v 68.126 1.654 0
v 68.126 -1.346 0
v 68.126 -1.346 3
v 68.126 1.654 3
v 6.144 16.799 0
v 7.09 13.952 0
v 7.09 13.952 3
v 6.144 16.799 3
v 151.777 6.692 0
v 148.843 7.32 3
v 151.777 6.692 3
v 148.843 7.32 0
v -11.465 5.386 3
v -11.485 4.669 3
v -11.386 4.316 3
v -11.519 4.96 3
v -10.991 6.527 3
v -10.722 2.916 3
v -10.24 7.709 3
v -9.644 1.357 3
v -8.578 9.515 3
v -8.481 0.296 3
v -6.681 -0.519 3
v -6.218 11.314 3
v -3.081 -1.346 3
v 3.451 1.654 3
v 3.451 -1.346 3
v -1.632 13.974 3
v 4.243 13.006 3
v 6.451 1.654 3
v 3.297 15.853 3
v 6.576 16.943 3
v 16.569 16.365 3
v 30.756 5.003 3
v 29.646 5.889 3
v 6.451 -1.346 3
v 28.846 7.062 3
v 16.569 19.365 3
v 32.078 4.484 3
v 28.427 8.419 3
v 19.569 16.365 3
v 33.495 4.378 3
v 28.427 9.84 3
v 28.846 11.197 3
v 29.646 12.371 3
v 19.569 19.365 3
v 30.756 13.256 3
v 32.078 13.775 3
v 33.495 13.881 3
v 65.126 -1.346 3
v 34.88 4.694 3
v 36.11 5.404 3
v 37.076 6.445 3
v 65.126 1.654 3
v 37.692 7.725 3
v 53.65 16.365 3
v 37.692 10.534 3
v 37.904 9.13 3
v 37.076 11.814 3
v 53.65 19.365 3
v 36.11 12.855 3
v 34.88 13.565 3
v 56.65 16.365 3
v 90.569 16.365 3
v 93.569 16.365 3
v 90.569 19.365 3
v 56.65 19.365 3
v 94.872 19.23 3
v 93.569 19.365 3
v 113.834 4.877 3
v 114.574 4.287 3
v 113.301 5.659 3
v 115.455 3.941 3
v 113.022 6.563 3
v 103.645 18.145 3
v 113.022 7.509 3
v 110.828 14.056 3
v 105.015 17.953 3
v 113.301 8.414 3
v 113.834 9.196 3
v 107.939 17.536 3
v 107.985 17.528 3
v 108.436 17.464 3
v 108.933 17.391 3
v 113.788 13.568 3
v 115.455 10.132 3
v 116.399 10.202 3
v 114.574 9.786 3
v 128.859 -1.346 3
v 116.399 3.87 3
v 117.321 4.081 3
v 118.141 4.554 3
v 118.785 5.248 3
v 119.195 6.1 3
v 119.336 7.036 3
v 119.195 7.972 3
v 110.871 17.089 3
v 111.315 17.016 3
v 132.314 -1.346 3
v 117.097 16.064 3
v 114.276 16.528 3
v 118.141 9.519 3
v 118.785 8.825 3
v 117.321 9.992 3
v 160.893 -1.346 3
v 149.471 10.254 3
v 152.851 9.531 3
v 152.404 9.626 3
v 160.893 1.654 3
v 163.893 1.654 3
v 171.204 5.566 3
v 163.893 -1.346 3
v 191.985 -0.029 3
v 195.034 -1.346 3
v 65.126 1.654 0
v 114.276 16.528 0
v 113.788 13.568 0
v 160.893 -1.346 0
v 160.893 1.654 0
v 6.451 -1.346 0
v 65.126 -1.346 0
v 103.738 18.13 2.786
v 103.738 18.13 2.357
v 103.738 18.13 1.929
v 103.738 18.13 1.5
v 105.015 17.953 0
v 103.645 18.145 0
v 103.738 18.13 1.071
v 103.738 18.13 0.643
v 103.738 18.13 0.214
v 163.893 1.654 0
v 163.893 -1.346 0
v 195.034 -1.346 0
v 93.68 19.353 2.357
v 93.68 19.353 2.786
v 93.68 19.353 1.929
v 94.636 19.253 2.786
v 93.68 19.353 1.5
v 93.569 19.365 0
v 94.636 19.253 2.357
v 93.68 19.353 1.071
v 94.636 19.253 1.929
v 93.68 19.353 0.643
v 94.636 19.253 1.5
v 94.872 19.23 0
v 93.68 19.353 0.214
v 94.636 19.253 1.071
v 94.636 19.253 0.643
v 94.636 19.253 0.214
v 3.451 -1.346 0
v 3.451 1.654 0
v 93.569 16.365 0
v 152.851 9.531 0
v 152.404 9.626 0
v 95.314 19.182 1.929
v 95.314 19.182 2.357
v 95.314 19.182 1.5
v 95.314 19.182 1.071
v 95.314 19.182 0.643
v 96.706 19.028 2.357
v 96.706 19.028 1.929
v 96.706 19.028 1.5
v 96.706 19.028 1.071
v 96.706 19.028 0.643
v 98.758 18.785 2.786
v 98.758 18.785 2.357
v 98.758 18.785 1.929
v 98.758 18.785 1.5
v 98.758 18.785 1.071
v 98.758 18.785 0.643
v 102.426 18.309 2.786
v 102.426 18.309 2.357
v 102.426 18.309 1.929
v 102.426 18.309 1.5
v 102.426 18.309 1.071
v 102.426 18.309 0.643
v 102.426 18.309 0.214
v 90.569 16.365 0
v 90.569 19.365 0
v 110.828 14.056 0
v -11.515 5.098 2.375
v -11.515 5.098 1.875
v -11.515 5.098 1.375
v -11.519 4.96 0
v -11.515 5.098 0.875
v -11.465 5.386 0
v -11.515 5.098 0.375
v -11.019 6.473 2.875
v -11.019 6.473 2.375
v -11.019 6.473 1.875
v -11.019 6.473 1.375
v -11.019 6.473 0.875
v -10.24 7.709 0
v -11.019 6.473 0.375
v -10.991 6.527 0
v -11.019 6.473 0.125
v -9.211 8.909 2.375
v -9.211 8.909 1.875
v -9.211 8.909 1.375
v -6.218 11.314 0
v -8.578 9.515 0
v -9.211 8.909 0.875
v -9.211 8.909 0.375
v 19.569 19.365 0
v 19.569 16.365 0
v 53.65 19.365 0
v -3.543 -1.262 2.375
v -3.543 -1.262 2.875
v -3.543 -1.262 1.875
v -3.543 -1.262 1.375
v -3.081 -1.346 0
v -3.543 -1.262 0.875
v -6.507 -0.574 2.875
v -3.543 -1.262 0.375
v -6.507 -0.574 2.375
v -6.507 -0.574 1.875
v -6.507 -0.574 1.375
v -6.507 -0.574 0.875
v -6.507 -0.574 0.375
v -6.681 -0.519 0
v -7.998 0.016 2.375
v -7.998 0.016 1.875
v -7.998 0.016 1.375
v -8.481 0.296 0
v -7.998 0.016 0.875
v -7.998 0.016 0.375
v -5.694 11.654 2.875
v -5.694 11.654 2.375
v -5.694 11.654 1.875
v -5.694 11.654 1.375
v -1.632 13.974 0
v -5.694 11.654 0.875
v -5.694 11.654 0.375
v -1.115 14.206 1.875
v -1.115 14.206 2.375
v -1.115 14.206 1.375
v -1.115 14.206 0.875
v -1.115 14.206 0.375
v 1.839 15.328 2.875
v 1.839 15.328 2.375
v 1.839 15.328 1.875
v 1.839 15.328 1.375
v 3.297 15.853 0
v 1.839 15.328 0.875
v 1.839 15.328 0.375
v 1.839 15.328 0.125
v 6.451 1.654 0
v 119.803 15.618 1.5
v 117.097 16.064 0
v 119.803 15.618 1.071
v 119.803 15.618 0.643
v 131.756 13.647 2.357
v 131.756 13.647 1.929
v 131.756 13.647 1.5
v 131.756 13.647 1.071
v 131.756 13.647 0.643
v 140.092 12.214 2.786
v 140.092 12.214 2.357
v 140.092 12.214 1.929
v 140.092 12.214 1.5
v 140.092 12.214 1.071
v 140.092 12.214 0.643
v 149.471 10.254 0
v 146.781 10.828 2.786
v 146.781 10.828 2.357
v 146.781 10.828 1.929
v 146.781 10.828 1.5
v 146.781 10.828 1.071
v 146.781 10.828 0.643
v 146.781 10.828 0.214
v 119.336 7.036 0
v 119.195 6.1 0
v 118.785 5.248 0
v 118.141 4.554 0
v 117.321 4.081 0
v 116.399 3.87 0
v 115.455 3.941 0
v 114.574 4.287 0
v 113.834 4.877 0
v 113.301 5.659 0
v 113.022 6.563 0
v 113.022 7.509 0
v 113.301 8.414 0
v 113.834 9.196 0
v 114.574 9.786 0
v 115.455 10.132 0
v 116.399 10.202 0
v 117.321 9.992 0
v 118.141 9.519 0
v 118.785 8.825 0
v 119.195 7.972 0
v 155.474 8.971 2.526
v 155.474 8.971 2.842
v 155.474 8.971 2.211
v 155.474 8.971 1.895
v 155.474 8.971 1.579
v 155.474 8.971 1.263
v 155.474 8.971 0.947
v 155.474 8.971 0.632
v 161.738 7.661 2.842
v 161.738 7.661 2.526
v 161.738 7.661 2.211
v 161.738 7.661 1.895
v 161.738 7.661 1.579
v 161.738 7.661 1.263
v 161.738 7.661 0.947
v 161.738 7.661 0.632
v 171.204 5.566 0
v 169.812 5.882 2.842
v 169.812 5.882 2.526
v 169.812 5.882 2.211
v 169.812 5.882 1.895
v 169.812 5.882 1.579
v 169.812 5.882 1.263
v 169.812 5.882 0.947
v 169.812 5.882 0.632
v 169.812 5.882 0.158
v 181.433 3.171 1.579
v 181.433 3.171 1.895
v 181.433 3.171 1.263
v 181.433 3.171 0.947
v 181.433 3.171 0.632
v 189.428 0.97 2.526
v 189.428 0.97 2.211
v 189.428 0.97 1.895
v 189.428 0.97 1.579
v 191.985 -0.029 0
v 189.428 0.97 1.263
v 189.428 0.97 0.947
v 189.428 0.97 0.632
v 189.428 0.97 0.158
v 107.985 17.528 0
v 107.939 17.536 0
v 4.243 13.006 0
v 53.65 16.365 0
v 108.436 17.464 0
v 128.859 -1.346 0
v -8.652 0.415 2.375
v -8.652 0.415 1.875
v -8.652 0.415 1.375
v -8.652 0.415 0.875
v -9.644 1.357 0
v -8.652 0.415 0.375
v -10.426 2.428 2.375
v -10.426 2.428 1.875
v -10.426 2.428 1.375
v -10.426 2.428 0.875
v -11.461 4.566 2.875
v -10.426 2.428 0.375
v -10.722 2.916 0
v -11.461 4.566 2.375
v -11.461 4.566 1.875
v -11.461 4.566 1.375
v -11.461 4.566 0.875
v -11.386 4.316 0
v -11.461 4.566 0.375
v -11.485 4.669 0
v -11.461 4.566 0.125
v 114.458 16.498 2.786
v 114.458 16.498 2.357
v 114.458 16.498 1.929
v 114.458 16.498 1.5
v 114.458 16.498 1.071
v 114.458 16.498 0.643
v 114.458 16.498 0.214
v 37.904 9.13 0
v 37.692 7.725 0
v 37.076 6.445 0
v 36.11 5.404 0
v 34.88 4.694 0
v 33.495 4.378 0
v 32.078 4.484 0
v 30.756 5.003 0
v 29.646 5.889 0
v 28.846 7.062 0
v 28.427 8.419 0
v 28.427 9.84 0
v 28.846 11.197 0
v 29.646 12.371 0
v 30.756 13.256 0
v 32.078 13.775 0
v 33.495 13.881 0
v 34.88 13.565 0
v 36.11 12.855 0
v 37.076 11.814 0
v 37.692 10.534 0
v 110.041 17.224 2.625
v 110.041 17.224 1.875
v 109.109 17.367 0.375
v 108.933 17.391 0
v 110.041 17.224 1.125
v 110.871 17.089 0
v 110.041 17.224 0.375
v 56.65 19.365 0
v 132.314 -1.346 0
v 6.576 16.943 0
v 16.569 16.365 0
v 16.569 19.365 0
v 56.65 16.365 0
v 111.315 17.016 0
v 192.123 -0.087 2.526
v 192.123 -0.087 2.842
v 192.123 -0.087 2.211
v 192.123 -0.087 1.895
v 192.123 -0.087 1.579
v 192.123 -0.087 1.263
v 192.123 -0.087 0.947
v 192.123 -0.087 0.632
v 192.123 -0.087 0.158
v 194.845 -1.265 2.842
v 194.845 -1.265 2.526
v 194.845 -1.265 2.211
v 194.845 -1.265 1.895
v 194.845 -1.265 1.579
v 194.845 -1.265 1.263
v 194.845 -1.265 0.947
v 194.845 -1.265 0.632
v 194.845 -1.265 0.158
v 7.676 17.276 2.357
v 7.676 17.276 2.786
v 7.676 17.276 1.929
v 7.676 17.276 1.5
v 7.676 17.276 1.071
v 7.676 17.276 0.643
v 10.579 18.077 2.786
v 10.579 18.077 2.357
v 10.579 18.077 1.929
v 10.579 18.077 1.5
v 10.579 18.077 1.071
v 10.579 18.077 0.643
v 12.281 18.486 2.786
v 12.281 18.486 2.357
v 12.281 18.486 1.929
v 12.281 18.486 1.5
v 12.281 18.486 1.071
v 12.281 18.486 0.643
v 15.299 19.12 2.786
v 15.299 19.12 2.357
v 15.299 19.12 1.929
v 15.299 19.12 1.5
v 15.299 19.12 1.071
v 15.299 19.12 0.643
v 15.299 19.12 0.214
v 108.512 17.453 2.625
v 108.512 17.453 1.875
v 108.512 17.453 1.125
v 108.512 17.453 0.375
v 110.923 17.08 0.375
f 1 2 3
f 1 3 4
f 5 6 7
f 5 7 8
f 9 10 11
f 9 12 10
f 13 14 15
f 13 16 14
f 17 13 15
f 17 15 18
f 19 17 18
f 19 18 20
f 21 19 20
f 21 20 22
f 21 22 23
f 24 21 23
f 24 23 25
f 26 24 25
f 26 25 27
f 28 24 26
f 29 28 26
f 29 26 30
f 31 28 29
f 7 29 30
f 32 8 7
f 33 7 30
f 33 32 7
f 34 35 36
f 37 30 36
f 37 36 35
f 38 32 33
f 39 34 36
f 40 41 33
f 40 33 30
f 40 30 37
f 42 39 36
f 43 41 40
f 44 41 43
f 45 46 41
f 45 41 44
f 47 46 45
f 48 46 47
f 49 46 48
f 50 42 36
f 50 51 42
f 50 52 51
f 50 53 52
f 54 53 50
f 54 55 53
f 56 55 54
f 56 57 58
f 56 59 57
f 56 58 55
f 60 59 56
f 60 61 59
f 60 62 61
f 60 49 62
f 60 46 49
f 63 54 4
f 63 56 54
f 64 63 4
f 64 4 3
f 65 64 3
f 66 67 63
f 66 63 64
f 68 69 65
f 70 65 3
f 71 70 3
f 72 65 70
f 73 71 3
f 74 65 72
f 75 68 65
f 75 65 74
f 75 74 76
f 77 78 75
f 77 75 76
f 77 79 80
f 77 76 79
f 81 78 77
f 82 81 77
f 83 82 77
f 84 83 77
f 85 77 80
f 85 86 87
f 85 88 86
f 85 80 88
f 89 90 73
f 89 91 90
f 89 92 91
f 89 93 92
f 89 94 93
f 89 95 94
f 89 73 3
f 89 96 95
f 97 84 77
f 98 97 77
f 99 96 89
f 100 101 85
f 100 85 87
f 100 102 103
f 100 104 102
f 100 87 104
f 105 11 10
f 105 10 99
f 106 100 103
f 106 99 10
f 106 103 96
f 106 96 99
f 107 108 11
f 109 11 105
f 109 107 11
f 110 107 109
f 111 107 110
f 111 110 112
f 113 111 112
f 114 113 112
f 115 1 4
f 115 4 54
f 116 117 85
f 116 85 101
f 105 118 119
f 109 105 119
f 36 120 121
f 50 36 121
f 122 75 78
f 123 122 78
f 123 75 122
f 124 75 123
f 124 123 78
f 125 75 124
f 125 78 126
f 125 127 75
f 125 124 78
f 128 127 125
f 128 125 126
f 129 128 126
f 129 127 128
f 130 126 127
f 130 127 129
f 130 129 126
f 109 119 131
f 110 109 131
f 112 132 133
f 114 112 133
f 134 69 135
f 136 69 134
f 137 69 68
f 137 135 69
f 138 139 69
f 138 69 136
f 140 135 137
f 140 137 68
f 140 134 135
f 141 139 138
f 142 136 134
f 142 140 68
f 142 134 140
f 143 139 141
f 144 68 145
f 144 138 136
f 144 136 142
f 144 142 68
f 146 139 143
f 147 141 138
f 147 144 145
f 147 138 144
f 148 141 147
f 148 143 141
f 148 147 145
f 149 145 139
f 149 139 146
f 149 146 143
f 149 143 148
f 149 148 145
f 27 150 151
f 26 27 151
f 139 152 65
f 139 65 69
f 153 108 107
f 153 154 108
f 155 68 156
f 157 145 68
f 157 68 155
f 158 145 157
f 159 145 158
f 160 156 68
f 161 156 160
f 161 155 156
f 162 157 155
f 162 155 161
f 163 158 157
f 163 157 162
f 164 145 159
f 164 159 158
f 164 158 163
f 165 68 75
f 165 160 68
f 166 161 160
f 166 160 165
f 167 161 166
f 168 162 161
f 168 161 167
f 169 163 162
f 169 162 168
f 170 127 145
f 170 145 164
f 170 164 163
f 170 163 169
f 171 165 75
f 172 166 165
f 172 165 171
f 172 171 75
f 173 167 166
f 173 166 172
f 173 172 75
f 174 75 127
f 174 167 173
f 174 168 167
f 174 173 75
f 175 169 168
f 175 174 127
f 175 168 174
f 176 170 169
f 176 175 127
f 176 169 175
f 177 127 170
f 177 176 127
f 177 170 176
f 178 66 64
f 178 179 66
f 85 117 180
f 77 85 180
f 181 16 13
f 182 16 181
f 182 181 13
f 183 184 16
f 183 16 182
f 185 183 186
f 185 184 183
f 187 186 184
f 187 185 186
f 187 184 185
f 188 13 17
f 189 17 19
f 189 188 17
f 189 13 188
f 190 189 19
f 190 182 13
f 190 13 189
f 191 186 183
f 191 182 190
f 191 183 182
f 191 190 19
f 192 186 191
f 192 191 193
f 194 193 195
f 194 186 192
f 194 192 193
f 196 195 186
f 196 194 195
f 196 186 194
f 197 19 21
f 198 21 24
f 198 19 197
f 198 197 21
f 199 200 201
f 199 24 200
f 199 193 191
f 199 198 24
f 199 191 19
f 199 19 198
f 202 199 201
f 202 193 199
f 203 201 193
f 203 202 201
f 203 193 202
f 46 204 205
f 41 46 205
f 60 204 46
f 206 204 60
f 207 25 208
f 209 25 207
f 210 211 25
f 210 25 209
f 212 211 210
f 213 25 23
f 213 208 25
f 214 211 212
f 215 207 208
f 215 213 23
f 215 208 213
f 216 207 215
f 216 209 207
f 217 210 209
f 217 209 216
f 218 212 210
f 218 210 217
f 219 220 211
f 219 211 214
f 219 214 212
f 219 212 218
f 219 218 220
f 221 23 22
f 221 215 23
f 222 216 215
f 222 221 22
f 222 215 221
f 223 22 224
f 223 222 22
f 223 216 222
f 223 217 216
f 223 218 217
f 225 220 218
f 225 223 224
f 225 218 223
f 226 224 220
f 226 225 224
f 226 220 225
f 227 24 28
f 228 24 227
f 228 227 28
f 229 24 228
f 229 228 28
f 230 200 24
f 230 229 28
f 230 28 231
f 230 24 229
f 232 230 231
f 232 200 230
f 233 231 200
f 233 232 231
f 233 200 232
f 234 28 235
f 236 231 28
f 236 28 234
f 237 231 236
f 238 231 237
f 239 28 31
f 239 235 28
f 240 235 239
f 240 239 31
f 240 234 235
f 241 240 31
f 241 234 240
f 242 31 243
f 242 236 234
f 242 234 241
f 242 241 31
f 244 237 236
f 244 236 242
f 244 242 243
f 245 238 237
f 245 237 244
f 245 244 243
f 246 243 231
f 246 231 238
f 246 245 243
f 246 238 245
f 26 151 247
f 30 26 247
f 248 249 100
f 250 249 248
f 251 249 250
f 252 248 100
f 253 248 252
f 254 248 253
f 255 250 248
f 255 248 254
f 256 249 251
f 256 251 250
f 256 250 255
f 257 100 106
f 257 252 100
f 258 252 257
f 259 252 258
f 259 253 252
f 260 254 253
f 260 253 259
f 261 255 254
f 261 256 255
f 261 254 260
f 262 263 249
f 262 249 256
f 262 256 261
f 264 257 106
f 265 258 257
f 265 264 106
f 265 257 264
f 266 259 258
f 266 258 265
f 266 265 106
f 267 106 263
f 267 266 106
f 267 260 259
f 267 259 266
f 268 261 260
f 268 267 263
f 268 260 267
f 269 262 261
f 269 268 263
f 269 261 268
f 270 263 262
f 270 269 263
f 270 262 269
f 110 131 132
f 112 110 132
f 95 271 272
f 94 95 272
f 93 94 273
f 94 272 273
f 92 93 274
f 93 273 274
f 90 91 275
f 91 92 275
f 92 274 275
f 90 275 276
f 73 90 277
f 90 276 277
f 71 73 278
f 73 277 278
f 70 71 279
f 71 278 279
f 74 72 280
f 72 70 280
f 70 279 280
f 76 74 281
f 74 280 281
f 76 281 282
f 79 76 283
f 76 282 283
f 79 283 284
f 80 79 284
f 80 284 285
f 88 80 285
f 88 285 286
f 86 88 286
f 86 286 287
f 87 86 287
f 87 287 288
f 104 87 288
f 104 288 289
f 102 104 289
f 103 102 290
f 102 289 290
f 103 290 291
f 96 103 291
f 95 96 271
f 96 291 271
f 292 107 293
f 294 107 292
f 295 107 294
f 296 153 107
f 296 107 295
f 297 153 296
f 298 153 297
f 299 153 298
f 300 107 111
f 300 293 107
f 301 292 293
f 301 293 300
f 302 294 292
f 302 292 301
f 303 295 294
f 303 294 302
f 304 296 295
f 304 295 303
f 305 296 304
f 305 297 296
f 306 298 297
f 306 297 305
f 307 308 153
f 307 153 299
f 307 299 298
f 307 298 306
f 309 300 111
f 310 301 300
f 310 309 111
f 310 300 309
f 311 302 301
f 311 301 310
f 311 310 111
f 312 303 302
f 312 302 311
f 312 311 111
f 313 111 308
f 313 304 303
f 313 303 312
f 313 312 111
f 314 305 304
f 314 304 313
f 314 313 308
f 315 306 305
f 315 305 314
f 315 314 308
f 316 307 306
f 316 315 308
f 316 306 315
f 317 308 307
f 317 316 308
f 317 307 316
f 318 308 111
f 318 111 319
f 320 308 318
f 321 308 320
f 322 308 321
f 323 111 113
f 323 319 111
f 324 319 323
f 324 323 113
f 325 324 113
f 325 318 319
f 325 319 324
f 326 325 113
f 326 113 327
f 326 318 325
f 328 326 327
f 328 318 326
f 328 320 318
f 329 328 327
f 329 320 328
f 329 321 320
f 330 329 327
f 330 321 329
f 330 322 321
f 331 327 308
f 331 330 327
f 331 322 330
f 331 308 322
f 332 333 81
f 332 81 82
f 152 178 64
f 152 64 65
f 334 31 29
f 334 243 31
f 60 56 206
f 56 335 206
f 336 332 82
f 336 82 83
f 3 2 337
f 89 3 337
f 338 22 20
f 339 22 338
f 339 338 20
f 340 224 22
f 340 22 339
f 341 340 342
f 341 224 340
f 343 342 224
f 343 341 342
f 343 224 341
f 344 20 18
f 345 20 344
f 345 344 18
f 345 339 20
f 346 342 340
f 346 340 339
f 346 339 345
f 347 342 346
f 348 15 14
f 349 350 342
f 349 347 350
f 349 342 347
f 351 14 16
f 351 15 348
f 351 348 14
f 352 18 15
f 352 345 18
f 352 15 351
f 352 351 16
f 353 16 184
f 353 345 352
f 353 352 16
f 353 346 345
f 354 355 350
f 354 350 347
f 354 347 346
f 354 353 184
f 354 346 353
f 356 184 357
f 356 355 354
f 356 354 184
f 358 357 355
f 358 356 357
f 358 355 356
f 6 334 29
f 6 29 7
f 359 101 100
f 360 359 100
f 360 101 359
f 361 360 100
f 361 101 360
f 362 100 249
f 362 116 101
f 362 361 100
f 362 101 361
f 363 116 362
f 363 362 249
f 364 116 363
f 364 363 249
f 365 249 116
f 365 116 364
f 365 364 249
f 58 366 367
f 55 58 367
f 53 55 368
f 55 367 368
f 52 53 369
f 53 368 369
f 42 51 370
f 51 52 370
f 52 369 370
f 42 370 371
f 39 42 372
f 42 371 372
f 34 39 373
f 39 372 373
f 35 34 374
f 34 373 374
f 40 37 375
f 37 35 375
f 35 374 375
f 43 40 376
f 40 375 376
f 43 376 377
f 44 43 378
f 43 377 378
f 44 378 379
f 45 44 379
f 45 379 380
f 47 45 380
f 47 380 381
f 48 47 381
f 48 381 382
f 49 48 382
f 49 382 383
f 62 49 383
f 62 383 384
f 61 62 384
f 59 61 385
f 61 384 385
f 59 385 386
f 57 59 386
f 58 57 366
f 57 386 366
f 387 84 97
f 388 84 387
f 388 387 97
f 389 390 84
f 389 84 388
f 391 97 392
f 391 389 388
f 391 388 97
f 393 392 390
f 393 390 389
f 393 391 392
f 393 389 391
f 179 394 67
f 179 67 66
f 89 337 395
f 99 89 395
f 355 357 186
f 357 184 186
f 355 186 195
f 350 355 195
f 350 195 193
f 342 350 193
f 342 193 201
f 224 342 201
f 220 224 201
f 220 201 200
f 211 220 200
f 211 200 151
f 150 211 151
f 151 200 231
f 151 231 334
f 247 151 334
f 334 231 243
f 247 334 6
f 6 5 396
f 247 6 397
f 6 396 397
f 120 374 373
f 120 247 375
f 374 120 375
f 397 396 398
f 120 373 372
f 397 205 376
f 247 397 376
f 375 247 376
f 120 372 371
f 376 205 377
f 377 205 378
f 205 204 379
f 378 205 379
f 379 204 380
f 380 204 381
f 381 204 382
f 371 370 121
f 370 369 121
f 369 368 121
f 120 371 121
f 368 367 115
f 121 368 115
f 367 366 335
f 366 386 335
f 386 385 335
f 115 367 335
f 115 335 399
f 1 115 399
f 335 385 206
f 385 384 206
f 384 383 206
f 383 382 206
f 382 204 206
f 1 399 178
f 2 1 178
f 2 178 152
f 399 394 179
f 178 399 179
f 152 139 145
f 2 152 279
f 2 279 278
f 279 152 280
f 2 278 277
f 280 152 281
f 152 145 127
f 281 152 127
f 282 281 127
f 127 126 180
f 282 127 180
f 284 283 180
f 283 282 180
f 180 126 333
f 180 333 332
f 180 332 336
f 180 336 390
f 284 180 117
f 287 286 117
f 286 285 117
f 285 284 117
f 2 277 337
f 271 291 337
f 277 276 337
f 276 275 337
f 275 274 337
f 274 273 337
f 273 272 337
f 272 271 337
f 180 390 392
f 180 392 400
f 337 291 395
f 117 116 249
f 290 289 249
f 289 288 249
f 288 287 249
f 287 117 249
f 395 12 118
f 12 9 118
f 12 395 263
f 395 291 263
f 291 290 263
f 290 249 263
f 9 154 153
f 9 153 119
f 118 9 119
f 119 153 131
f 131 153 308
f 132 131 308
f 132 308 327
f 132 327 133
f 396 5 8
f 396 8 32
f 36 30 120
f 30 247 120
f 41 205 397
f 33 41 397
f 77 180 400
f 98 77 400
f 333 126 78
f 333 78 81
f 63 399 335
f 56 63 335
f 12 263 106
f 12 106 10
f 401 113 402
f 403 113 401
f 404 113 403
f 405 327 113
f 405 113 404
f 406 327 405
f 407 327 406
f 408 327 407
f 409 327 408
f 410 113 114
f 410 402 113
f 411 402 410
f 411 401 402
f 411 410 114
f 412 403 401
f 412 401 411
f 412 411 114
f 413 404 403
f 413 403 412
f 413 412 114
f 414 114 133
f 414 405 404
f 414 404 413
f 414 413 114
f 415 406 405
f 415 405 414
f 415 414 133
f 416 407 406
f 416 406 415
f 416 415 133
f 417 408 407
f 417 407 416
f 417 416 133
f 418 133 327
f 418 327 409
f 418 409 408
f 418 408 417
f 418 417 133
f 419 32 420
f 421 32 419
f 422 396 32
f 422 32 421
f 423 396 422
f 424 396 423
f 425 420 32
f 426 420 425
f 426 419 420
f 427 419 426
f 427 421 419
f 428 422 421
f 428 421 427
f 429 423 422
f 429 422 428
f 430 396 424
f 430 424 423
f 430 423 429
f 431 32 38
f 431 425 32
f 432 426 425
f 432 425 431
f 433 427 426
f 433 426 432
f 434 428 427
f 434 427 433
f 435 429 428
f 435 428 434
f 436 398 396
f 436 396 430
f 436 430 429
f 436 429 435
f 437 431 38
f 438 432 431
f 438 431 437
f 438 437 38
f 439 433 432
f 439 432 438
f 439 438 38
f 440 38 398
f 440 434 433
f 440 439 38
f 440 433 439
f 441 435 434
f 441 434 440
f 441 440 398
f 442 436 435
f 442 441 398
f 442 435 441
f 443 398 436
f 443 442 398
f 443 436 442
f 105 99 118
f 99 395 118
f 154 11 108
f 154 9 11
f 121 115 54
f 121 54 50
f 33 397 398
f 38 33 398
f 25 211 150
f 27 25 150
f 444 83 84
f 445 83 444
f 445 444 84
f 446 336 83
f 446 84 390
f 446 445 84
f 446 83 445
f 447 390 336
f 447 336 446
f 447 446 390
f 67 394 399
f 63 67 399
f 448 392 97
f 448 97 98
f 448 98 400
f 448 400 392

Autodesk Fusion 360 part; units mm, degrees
sketch "Sketch1" plane through (0, 0, 0) normal (0, 0, 1) x (1, 0, 0) in component "Airfoil structure"
  spline S0 degree 5 poles (152.8506, 9.5306) (153.6754, 9.3537) (155.1958, 9.0287) (157.0885, 8.6275) (158.936, 8.2427) (160.6637, 7.8881) (162.4454, 7.5151) (164.8303, 6.998) (168.0437, 6.2836) (171.9513, 5.3996) (176.2204, 4.4167) (180.4193, 3.4264) (184.1364, 2.5129) (187.0894, 1.7283) (189.2467, 1.0645) (190.9412, 0.4268) (192.3181, -0.1665) (193.5665, -0.7111) (194.5238, -1.126) (195.0337, -1.3464) knots 0 0 0 0 0 0 0.066667 0.133333 0.2 0.266667 0.333333 0.4 0.466667 0.533333 0.6 0.666667 0.733333 0.8 0.866667 0.933333 1 1 1 1 1 1
  line L0 (148.4907, 10.4656) -> (157.2105, 8.5955)
  line L1 (191.9852, -0.0289) -> (198.0822, -2.6639)
  circle A0 centre (33.1388, 9.1296) radius 4.765
  circle A1 centre (116.1615, 7.0362) radius 3.175
  spline S1 degree 5 poles (-3.081, -1.3464) (-3.6016, -1.2536) (-4.5414, -1.0763) (-5.6463, -0.8353) (-6.5938, -0.5669) (-7.329, -0.2953) (-8.0513, 0.0089) (-9.0194, 0.5707) (-10.0683, 1.7874) (-10.9642, 3.2518) (-11.5103, 4.4866) (-11.5777, 5.0951) (-11.407, 5.643) (-11.0112, 6.6067) (-10.1307, 7.993) (-8.6022, 9.6431) (-6.4035, 11.272) (-4.1965, 12.5715) (-2.7349, 13.4061) (-1.8316, 13.8946) (-1.0216, 14.2664) (0.0955, 14.6934) (1.459, 15.1916) (2.6392, 15.6173) (3.2971, 15.8534) knots 0 0 0 0 0 0 0.05 0.1 0.15 0.2 0.25 0.3 0.35 0.4 0.45 0.5 0.55 0.6 0.65 0.7 0.75 0.8 0.85 0.9 0.95 1 1 1 1 1 1
  line L2 (0.5703, -1.9971) -> (-6.7323, -0.6957)
  line L3 (-0.0118, 14.6656) -> (6.606, 17.0412)
  line L4 (-8.4792, 9.8153) -> (-3.9569, 12.8132)
  line L5 (-11.5034, 4.2257) -> (-11.5345, 5.6935)
  line L6 (-7.2174, -0.5359) -> (-9.7443, 1.1286)
  spline S2 degree 5 poles (93.5688, 19.3646) (93.8188, 19.3387) (94.2829, 19.2905) (94.8714, 19.229) (95.4658, 19.1659) (96.0263, 19.1049) (96.567, 19.0445) (97.2368, 18.9678) (98.1315, 18.8622) (99.313, 18.7173) (100.8214, 18.5245) (102.3118, 18.3263) (103.5973, 18.1504) (104.53, 18.0207) (105.0153, 17.9528) knots 0 0 0 0 0 0 0.1 0.2 0.3 0.4 0.5 0.6 0.7 0.8 0.9 1 1 1 1 1 1
  line L7 (92.266, 19.4996) -> (94.8715, 19.2297)
  line L8 (103.6448, 18.1447) -> (106.3858, 17.761)
  spline S3 degree 5 poles (6.5765, 16.943) (6.9079, 17.0449) (7.5374, 17.2364) (8.3817, 17.4868) (9.3156, 17.7508) (10.2084, 17.9865) (10.8922, 18.156) (11.4504, 18.29) (11.9864, 18.4184) (12.6265, 18.5675) (13.504, 18.76) (14.4962, 18.9637) (15.447, 19.1503) (16.1786, 19.2906) (16.5688, 19.3646) knots 0 0 0 0 0 0 0.1 0.2 0.3 0.4 0.5 0.6 0.7 0.8 0.9 1 1 1 1 1 1
  line L9 (5.4107, 16.5846) -> (7.7424, 17.3015)
  line L10 (15.2328, 19.111) -> (17.9048, 19.6183)
  line L11 (152.4045, 9.626) -> (152.8506, 9.5306)
  line L12 (107.9851, 17.5282) -> (108.4359, 17.4637)
  line L13 (6.1441, 16.7993) -> (6.5765, 16.943)
  line L14 (128.8588, -1.3464) -> (132.3138, -1.3464)
  line L15 (149.471, 10.2539) -> (148.8431, 7.3203)
  line L16 (148.8431, 7.3203) -> (151.7767, 6.6925)
  line L17 (151.7767, 6.6925) -> (152.4045, 9.626)
  line L18 (3.2971, 15.8534) -> (4.243, 13.0064)
  line L19 (4.243, 13.0064) -> (7.09, 13.9524)
  line L20 (7.09, 13.9524) -> (6.1441, 16.7993)
  line L21 (160.8934, -1.3464) -> (160.8934, 1.6536)
  line L22 (160.8934, 1.6536) -> (163.8934, 1.6536)
  line L23 (163.8934, 1.6536) -> (163.8934, -1.3464)
  line L24 (132.3138, -1.3464) -> (160.8934, -1.3464)
  line L25 (163.8934, -1.3464) -> (195.0337, -1.3464)
  line L26 (3.4513, -1.3464) -> (3.4513, 1.6536)
  line L27 (3.4513, 1.6536) -> (6.4513, 1.6536)
  line L28 (6.4513, 1.6536) -> (6.4513, -1.3464)
  line L29 (-3.081, -1.3464) -> (3.4513, -1.3464)
  line L30 (105.0153, 17.9528) -> (107.9851, 17.5282)
  line L31 (19.5688, 19.3646) -> (19.5688, 16.3646)
  line L32 (19.5688, 16.3646) -> (16.5688, 16.3646)
  line L33 (16.5688, 16.3646) -> (16.5688, 19.3646)
  line L34 (90.5688, 19.3646) -> (90.5688, 16.3646)
  line L35 (90.5688, 16.3646) -> (93.5688, 16.3646)
  line L36 (93.5688, 16.3646) -> (93.5688, 19.3646)
  line L37 (113.7881, 13.5683) -> (110.8279, 14.0557)
  line L38 (110.8279, 14.0557) -> (111.3153, 17.0159)
  line L39 (113.7881, 13.5683) -> (114.2755, 16.5285)
  spline S4 degree 5 poles (108.4359, 17.4637) (108.6467, 17.433) (108.9931, 17.3831) (109.2865, 17.3426) (109.4547, 17.3194) (110.0313, 17.2264) (110.7239, 17.113) (111.2088, 17.0334) (111.3153, 17.0159) knots 0 0 0 0 0 0 0.066667 0.133333 0.2 0.217791 0.217791 0.217791 0.217791 0.217791 0.217791
  line L40 (107.9387, 17.5361) -> (108.933, 17.3913)
  line L41 (110.8712, 17.0888) -> (111.7595, 16.9429)
  spline S5 degree 5 poles (114.2755, 16.5285) (114.9096, 16.424) (116.2698, 16.2) (118.5862, 15.8186) (122.1455, 15.233) (126.9408, 14.4438) (131.5558, 13.6821) (135.521, 13.0215) (138.5596, 12.5011) (140.775, 12.0942) (142.7661, 11.6889) (144.7964, 11.2532) (146.8777, 10.807) (148.5577, 10.4484) (149.471, 10.2539) knots 0 0 0 0 0 0 0.1 0.2 0.3 0.4 0.5 0.6 0.7 0.8 0.9 1 1 1 1 1 1
  line L42 (111.4536, 16.9934) -> (117.0973, 16.0636)
  line L43 (143.5745, 11.5101) -> (155.3674, 8.9976)
  line L44 (56.6502, 19.3646) -> (56.6502, 16.3646)
  line L45 (56.6502, 16.3646) -> (53.6502, 16.3646)
  line L46 (53.6502, 16.3646) -> (53.6502, 19.3646)
  line L47 (19.5688, 19.3646) -> (53.6502, 19.3646)
  line L48 (56.6502, 19.3646) -> (90.5688, 19.3646)
  line L49 (68.1265, -1.3464) -> (68.1265, 1.6536)
  line L50 (68.1265, 1.6536) -> (65.1265, 1.6536)
  line L51 (65.1265, 1.6536) -> (65.1265, -1.3464)
  line L52 (6.4513, -1.3464) -> (65.1265, -1.3464)
  line L53 (68.1265, -1.3464) -> (128.8588, -1.3464)
  point P0 (-8.4808, 0.2964)
  point P1 (-11.5189, 4.9596)
  point P2 (-6.2181, 11.3142)
  point P3 (11.4183, 18.2822)
  point P4 (96.5722, 19.0435)
  point P5 (109.7229, 17.2753)
  point P6 (137.8507, 12.6179)
  point P7 (163.7248, 7.2358)
  point P8 (186.791, 1.7868)
  dimension "d38" = 77
  dimension "d53" = 9.53
  dimension "d54" = 6.35
  dimension "d59" = 3
  dimension "d67" = 3
extrude "Extrude2" add sketch "Sketch1" along normal blind 3 contours S0 L0 L1 S1 S2 L7 L8 S3 L11 L12 L13 L14 L15 L16 L17 L18 L19 L20 L21 L22 L23 L24 L25 L26 L27 L28 L29 L30 L31 L32 L33 L34 L35 L36 L37 L38 L39 S4 L40 L41 S5 L42 L44 L45 L46 L47 L48 L49 L50 L51 L52 L53
sketch "Sketch3" plane through (0, 0, 0) normal (0, 0, 1) x (1, 0, 0)
component "Airfoil structure" placed x (1, 0, 0) y (0, 1, 0) z (0, 0, 1) at (0, 0, 0)
